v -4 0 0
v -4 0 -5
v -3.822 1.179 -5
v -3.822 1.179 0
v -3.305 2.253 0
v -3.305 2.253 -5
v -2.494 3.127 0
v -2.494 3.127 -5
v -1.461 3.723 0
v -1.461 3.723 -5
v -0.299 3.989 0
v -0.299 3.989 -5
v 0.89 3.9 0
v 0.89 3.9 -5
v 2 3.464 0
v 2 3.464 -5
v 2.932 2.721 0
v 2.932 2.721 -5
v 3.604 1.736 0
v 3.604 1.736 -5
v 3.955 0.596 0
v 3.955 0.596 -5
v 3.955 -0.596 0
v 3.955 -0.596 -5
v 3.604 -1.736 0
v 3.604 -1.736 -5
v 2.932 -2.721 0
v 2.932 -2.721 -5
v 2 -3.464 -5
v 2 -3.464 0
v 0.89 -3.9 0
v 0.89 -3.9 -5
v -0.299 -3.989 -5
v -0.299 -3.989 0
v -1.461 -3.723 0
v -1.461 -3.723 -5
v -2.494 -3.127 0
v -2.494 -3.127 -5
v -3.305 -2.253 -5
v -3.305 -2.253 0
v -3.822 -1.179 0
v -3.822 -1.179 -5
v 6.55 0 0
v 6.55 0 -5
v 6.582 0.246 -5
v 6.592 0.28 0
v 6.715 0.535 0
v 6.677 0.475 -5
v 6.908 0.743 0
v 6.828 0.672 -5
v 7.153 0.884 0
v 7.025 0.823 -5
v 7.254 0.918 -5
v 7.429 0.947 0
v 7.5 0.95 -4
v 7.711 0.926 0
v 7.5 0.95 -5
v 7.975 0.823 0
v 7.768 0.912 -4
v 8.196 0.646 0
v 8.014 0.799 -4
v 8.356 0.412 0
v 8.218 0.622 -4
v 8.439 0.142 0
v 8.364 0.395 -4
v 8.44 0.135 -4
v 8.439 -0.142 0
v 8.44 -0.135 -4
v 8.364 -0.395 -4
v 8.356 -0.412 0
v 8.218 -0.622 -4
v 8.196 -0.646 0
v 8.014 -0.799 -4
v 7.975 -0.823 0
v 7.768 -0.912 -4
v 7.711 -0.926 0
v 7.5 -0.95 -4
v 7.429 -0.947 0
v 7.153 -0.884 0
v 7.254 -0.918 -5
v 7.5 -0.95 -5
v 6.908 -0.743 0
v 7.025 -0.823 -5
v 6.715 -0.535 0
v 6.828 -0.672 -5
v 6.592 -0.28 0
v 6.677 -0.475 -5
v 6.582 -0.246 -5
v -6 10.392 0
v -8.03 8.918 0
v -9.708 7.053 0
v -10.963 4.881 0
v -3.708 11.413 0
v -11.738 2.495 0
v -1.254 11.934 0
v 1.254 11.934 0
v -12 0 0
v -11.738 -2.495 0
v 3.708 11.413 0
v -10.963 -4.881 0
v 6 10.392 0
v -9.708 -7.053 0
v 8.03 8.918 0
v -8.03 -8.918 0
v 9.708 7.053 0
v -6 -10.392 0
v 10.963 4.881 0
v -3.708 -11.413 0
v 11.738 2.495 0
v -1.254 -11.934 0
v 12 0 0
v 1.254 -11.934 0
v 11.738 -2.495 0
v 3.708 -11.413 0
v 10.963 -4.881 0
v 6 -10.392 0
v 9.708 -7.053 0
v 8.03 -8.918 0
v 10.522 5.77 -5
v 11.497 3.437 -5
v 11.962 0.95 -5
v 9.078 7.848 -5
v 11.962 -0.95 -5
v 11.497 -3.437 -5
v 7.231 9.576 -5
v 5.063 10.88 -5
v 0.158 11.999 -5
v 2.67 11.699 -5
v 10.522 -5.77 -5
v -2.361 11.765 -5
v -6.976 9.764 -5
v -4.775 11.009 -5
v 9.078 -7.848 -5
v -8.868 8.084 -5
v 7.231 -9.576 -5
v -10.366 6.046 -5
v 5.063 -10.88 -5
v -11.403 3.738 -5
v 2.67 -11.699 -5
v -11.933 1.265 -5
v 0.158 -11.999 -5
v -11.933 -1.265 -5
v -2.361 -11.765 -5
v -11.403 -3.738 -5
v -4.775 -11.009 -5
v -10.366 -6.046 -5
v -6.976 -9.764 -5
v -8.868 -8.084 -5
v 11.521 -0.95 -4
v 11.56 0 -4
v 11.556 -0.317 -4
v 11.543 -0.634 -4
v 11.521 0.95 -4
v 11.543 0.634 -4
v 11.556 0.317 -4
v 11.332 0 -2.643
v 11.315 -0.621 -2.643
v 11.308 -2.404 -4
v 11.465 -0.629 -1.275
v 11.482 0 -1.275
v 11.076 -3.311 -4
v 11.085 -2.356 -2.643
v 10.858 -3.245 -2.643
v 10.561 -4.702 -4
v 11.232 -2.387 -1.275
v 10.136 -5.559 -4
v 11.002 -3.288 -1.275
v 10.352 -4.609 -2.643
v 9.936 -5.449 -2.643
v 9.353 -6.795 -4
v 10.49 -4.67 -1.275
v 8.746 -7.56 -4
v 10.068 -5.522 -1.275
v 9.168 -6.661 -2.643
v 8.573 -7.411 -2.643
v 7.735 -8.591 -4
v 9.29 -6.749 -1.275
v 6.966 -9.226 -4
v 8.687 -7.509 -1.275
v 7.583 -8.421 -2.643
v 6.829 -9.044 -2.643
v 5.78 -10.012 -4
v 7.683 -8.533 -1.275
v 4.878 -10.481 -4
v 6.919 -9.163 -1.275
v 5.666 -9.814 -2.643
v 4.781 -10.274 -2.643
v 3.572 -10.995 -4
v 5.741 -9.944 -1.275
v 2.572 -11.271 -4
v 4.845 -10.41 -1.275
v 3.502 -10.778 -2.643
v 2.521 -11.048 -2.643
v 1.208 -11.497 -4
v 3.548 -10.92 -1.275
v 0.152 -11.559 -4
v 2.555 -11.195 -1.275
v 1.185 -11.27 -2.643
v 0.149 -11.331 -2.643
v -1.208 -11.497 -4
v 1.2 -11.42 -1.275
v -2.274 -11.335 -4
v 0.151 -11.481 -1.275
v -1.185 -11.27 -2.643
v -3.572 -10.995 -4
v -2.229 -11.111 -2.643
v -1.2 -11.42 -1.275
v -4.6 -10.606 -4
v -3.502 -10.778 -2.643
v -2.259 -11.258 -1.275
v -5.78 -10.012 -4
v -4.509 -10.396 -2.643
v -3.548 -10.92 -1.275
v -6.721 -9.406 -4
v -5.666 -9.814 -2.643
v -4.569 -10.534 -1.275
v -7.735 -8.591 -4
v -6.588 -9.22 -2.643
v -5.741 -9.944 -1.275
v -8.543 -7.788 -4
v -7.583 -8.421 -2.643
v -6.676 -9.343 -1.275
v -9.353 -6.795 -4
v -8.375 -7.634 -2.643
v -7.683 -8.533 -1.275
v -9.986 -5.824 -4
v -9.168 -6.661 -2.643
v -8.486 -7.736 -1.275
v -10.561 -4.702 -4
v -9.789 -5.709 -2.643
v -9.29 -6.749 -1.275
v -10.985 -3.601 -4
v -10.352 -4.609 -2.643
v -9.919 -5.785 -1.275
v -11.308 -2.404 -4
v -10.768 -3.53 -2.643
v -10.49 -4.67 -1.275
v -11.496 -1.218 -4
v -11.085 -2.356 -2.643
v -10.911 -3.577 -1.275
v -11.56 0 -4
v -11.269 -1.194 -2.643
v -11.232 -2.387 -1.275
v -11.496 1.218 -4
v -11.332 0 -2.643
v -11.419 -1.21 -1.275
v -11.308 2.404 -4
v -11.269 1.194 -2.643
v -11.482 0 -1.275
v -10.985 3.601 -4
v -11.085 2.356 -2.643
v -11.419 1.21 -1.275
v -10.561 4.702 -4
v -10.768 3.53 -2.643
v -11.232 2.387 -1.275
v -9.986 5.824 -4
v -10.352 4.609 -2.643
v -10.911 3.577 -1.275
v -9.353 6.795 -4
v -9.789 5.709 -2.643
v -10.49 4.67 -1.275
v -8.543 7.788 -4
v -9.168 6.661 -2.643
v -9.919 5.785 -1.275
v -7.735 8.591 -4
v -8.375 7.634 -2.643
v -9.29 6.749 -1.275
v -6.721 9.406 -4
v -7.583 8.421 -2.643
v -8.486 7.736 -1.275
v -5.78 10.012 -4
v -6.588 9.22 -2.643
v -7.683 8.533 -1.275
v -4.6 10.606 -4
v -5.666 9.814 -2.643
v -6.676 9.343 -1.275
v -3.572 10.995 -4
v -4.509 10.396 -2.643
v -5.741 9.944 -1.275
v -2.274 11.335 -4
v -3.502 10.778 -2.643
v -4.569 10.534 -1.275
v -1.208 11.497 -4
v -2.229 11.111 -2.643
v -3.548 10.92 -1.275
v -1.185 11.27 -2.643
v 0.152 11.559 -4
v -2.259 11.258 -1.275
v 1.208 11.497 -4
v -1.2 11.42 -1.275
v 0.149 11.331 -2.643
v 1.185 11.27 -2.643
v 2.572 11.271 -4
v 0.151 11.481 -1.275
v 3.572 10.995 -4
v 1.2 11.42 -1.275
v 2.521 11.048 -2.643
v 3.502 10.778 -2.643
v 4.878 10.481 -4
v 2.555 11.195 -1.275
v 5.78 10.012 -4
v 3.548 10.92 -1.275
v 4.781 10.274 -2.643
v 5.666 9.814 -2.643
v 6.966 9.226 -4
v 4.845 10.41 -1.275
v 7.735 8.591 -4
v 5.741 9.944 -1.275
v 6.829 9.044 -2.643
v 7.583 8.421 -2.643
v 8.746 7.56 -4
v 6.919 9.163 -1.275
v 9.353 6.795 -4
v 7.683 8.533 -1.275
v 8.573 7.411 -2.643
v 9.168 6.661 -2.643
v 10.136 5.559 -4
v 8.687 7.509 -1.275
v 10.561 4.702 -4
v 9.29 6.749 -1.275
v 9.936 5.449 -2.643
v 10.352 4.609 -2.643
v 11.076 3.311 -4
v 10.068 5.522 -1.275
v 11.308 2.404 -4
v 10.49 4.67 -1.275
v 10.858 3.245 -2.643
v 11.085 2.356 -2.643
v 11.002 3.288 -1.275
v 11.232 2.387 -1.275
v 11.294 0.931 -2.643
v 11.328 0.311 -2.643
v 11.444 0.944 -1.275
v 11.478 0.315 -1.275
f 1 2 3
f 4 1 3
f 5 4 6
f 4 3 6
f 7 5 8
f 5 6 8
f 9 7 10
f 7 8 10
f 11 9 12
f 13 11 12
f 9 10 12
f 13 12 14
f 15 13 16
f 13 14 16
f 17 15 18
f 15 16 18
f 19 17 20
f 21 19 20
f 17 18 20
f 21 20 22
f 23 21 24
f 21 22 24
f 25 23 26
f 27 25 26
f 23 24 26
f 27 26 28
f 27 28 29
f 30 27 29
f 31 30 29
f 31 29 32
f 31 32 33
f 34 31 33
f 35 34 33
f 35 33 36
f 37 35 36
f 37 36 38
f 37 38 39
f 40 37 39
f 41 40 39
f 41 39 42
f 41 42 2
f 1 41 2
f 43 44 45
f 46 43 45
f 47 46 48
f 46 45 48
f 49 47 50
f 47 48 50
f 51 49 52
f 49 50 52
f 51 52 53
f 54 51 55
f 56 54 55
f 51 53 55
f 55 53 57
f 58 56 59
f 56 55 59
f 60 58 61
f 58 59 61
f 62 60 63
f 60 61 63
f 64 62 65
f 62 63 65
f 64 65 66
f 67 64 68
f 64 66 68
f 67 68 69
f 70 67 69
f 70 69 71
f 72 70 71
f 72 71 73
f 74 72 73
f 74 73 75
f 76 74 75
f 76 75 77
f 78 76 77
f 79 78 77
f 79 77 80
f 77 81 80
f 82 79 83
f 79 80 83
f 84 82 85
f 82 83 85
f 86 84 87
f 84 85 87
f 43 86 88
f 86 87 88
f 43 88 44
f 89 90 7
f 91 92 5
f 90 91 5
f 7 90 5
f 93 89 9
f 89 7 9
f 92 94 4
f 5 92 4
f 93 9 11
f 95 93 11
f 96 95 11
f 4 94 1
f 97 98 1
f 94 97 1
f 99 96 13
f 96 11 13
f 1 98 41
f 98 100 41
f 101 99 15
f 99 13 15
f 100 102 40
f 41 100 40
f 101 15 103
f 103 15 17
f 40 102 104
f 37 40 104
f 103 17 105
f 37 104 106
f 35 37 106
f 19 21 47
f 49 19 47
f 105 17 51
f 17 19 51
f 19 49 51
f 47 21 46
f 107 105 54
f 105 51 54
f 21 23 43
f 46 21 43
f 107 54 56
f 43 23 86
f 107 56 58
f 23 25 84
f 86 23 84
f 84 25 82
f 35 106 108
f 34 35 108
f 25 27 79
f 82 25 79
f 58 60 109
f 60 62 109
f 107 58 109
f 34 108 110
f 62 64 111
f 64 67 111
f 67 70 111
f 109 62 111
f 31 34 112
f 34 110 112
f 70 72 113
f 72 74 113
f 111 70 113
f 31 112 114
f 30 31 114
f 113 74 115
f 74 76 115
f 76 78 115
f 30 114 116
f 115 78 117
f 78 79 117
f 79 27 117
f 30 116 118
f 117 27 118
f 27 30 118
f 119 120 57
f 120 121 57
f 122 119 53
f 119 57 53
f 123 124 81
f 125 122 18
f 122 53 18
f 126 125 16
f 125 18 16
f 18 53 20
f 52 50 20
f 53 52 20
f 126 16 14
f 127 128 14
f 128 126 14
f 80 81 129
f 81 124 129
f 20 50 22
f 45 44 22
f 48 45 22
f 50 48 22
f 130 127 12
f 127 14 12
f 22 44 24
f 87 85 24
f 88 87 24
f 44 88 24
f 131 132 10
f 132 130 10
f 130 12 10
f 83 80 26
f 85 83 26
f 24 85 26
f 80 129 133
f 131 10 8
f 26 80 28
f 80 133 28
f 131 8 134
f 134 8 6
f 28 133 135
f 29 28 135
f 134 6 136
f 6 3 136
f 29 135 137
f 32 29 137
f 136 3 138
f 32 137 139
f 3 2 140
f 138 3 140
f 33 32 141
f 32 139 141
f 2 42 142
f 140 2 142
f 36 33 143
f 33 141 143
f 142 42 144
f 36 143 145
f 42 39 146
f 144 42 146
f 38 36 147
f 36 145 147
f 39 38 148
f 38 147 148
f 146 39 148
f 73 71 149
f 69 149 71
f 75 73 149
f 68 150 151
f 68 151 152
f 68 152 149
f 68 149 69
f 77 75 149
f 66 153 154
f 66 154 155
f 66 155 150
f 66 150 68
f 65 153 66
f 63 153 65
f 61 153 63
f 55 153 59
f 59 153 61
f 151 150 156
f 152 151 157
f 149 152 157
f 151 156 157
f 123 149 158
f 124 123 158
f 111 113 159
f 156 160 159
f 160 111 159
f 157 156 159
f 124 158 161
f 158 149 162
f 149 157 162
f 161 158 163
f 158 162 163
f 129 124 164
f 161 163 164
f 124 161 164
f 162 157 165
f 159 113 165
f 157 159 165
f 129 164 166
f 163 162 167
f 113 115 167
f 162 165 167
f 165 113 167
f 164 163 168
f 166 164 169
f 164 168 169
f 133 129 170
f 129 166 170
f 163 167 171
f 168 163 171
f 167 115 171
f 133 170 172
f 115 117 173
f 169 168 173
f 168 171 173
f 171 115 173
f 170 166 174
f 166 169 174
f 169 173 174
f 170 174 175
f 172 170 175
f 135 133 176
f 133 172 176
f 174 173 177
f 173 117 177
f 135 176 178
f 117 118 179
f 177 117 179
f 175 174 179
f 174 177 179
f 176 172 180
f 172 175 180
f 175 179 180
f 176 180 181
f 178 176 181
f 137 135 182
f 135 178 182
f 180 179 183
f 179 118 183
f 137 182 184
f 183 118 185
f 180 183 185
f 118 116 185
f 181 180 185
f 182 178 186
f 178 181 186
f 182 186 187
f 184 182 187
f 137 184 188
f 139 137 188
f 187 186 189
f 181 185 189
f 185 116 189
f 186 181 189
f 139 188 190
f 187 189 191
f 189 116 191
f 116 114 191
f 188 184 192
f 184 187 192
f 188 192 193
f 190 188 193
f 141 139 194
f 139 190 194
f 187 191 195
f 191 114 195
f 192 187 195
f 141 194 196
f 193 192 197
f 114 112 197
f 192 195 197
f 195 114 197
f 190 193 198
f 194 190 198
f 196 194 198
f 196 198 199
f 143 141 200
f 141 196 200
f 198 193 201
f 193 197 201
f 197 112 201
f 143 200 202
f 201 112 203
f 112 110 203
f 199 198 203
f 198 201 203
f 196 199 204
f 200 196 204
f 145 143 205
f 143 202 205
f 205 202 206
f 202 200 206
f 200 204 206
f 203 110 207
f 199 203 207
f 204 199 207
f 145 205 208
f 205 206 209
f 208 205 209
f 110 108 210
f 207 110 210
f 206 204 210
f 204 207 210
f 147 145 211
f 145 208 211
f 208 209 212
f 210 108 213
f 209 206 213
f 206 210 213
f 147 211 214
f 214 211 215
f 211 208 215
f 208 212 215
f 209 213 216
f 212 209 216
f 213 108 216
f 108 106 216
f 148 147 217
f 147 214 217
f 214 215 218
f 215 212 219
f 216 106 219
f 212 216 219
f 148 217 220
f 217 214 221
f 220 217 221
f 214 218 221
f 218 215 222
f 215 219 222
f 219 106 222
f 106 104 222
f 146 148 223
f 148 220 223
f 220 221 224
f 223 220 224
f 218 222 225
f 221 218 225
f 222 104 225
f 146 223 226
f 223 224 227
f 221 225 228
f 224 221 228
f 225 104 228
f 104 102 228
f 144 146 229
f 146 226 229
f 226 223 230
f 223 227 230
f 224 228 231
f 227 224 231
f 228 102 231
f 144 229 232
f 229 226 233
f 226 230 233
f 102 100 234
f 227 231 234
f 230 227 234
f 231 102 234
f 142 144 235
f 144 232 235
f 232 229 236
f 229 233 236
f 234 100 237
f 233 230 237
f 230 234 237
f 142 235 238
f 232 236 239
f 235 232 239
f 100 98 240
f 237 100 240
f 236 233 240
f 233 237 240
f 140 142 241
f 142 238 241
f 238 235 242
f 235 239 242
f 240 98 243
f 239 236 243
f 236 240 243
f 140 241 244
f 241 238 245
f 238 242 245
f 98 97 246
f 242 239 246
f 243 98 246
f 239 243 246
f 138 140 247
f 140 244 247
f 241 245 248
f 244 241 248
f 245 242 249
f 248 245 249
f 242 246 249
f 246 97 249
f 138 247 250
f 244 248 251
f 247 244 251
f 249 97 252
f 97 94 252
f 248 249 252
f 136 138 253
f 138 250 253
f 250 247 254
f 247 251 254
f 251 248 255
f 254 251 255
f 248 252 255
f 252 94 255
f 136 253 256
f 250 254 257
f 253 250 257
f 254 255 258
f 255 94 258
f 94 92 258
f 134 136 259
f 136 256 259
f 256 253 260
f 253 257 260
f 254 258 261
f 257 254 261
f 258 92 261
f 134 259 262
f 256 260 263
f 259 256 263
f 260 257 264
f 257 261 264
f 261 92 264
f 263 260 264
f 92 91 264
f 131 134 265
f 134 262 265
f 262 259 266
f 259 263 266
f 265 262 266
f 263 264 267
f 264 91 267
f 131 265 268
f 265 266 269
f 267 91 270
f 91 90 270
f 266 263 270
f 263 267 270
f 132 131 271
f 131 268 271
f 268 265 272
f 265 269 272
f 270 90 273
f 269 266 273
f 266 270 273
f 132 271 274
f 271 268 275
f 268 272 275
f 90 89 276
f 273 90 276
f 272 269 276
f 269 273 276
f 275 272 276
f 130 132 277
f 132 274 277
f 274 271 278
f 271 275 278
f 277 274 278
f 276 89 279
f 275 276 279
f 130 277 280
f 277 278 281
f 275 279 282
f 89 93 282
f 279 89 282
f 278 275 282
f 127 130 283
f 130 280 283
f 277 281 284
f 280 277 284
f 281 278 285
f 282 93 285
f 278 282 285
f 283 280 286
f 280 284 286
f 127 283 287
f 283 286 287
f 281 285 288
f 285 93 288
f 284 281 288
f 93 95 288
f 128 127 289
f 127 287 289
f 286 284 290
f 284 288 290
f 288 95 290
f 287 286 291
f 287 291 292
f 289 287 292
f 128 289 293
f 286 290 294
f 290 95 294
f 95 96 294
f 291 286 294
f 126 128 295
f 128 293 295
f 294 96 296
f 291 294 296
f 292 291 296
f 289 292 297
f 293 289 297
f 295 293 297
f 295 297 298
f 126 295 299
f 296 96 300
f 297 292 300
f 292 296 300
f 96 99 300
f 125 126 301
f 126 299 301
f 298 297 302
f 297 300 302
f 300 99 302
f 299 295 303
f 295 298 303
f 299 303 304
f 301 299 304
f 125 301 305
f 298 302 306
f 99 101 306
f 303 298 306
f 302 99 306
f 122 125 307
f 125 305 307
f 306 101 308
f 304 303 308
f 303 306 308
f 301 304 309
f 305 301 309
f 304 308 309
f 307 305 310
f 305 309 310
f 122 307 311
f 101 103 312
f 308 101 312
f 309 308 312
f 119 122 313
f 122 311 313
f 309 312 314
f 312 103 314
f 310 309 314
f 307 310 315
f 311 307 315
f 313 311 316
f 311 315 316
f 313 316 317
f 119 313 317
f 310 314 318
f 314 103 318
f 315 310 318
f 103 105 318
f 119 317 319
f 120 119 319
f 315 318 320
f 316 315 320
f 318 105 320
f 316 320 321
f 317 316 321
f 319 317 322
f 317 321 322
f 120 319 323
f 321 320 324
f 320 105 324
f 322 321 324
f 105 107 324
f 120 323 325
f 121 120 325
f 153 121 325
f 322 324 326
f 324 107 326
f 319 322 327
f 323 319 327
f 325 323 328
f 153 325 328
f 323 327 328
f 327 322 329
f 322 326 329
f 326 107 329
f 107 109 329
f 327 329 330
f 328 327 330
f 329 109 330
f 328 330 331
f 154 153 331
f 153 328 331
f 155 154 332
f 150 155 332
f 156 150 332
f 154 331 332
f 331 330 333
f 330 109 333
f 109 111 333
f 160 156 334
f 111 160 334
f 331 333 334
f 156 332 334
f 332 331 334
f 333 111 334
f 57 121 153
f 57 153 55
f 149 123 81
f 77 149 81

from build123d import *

# Parameters (mm, degrees)
ESQUISSE2_R             = 4
ENL_V_MAT_EXTRU_1_DEPTH = 10
ESQUISSE3_R             = 0.95
ENL_V_MAT_EXTRU_2_DEPTH = 5
ESQUISSE5_W             = 5
ESQUISSE5_H             = 1.9
ENL_V_MAT_EXTRU_4_DEPTH = 1


with BuildPart() as part:
    # Esquisse1 → Révolution1 (revolve)
    with BuildSketch(Plane(origin=(0, 0, 0), x_dir=(1, 0, 0), z_dir=(0, 1, 0))):
        with BuildLine():
            Line((0, 0), (0, 5))
            Line((0, 5), (12, 5))
            ThreePointArc((12, 5), (11.330127019, 2.5), (12, 0))
            Line((12, 0), (0, 0))
        make_face()
    revolve(axis=Axis((0, 0, 0), (0, 0, -1)))

    # Esquisse2 → Enlèv. mat.-Extru.1 (cut)
    with BuildSketch(Plane(origin=(0, 0, -5), x_dir=(-1, 0, 0), z_dir=(0, 0, -1))):
        Circle(ESQUISSE2_R)
    extrude(amount=-ENL_V_MAT_EXTRU_1_DEPTH, mode=Mode.SUBTRACT)

    # Esquisse3 → Enlèv. mat.-Extru.2 (cut)
    with BuildSketch(Plane(origin=(0, 0, -5), x_dir=(-1, 0, 0), z_dir=(0, 0, -1))):
        with Locations((-7.5, 0)):
            Circle(ESQUISSE3_R)
    extrude(amount=-ENL_V_MAT_EXTRU_2_DEPTH, mode=Mode.SUBTRACT)

    # Esquisse5 → Enlèv. mat.-Extru.4 (cut)
    with BuildSketch(Plane(origin=(0, 0, -5), x_dir=(-1, 0, 0), z_dir=(0, 0, -1))):
        with Locations((-10, 0)):
            Rectangle(ESQUISSE5_W, ESQUISSE5_H)
    extrude(amount=-ENL_V_MAT_EXTRU_4_DEPTH, mode=Mode.SUBTRACT)


solid = part.part
